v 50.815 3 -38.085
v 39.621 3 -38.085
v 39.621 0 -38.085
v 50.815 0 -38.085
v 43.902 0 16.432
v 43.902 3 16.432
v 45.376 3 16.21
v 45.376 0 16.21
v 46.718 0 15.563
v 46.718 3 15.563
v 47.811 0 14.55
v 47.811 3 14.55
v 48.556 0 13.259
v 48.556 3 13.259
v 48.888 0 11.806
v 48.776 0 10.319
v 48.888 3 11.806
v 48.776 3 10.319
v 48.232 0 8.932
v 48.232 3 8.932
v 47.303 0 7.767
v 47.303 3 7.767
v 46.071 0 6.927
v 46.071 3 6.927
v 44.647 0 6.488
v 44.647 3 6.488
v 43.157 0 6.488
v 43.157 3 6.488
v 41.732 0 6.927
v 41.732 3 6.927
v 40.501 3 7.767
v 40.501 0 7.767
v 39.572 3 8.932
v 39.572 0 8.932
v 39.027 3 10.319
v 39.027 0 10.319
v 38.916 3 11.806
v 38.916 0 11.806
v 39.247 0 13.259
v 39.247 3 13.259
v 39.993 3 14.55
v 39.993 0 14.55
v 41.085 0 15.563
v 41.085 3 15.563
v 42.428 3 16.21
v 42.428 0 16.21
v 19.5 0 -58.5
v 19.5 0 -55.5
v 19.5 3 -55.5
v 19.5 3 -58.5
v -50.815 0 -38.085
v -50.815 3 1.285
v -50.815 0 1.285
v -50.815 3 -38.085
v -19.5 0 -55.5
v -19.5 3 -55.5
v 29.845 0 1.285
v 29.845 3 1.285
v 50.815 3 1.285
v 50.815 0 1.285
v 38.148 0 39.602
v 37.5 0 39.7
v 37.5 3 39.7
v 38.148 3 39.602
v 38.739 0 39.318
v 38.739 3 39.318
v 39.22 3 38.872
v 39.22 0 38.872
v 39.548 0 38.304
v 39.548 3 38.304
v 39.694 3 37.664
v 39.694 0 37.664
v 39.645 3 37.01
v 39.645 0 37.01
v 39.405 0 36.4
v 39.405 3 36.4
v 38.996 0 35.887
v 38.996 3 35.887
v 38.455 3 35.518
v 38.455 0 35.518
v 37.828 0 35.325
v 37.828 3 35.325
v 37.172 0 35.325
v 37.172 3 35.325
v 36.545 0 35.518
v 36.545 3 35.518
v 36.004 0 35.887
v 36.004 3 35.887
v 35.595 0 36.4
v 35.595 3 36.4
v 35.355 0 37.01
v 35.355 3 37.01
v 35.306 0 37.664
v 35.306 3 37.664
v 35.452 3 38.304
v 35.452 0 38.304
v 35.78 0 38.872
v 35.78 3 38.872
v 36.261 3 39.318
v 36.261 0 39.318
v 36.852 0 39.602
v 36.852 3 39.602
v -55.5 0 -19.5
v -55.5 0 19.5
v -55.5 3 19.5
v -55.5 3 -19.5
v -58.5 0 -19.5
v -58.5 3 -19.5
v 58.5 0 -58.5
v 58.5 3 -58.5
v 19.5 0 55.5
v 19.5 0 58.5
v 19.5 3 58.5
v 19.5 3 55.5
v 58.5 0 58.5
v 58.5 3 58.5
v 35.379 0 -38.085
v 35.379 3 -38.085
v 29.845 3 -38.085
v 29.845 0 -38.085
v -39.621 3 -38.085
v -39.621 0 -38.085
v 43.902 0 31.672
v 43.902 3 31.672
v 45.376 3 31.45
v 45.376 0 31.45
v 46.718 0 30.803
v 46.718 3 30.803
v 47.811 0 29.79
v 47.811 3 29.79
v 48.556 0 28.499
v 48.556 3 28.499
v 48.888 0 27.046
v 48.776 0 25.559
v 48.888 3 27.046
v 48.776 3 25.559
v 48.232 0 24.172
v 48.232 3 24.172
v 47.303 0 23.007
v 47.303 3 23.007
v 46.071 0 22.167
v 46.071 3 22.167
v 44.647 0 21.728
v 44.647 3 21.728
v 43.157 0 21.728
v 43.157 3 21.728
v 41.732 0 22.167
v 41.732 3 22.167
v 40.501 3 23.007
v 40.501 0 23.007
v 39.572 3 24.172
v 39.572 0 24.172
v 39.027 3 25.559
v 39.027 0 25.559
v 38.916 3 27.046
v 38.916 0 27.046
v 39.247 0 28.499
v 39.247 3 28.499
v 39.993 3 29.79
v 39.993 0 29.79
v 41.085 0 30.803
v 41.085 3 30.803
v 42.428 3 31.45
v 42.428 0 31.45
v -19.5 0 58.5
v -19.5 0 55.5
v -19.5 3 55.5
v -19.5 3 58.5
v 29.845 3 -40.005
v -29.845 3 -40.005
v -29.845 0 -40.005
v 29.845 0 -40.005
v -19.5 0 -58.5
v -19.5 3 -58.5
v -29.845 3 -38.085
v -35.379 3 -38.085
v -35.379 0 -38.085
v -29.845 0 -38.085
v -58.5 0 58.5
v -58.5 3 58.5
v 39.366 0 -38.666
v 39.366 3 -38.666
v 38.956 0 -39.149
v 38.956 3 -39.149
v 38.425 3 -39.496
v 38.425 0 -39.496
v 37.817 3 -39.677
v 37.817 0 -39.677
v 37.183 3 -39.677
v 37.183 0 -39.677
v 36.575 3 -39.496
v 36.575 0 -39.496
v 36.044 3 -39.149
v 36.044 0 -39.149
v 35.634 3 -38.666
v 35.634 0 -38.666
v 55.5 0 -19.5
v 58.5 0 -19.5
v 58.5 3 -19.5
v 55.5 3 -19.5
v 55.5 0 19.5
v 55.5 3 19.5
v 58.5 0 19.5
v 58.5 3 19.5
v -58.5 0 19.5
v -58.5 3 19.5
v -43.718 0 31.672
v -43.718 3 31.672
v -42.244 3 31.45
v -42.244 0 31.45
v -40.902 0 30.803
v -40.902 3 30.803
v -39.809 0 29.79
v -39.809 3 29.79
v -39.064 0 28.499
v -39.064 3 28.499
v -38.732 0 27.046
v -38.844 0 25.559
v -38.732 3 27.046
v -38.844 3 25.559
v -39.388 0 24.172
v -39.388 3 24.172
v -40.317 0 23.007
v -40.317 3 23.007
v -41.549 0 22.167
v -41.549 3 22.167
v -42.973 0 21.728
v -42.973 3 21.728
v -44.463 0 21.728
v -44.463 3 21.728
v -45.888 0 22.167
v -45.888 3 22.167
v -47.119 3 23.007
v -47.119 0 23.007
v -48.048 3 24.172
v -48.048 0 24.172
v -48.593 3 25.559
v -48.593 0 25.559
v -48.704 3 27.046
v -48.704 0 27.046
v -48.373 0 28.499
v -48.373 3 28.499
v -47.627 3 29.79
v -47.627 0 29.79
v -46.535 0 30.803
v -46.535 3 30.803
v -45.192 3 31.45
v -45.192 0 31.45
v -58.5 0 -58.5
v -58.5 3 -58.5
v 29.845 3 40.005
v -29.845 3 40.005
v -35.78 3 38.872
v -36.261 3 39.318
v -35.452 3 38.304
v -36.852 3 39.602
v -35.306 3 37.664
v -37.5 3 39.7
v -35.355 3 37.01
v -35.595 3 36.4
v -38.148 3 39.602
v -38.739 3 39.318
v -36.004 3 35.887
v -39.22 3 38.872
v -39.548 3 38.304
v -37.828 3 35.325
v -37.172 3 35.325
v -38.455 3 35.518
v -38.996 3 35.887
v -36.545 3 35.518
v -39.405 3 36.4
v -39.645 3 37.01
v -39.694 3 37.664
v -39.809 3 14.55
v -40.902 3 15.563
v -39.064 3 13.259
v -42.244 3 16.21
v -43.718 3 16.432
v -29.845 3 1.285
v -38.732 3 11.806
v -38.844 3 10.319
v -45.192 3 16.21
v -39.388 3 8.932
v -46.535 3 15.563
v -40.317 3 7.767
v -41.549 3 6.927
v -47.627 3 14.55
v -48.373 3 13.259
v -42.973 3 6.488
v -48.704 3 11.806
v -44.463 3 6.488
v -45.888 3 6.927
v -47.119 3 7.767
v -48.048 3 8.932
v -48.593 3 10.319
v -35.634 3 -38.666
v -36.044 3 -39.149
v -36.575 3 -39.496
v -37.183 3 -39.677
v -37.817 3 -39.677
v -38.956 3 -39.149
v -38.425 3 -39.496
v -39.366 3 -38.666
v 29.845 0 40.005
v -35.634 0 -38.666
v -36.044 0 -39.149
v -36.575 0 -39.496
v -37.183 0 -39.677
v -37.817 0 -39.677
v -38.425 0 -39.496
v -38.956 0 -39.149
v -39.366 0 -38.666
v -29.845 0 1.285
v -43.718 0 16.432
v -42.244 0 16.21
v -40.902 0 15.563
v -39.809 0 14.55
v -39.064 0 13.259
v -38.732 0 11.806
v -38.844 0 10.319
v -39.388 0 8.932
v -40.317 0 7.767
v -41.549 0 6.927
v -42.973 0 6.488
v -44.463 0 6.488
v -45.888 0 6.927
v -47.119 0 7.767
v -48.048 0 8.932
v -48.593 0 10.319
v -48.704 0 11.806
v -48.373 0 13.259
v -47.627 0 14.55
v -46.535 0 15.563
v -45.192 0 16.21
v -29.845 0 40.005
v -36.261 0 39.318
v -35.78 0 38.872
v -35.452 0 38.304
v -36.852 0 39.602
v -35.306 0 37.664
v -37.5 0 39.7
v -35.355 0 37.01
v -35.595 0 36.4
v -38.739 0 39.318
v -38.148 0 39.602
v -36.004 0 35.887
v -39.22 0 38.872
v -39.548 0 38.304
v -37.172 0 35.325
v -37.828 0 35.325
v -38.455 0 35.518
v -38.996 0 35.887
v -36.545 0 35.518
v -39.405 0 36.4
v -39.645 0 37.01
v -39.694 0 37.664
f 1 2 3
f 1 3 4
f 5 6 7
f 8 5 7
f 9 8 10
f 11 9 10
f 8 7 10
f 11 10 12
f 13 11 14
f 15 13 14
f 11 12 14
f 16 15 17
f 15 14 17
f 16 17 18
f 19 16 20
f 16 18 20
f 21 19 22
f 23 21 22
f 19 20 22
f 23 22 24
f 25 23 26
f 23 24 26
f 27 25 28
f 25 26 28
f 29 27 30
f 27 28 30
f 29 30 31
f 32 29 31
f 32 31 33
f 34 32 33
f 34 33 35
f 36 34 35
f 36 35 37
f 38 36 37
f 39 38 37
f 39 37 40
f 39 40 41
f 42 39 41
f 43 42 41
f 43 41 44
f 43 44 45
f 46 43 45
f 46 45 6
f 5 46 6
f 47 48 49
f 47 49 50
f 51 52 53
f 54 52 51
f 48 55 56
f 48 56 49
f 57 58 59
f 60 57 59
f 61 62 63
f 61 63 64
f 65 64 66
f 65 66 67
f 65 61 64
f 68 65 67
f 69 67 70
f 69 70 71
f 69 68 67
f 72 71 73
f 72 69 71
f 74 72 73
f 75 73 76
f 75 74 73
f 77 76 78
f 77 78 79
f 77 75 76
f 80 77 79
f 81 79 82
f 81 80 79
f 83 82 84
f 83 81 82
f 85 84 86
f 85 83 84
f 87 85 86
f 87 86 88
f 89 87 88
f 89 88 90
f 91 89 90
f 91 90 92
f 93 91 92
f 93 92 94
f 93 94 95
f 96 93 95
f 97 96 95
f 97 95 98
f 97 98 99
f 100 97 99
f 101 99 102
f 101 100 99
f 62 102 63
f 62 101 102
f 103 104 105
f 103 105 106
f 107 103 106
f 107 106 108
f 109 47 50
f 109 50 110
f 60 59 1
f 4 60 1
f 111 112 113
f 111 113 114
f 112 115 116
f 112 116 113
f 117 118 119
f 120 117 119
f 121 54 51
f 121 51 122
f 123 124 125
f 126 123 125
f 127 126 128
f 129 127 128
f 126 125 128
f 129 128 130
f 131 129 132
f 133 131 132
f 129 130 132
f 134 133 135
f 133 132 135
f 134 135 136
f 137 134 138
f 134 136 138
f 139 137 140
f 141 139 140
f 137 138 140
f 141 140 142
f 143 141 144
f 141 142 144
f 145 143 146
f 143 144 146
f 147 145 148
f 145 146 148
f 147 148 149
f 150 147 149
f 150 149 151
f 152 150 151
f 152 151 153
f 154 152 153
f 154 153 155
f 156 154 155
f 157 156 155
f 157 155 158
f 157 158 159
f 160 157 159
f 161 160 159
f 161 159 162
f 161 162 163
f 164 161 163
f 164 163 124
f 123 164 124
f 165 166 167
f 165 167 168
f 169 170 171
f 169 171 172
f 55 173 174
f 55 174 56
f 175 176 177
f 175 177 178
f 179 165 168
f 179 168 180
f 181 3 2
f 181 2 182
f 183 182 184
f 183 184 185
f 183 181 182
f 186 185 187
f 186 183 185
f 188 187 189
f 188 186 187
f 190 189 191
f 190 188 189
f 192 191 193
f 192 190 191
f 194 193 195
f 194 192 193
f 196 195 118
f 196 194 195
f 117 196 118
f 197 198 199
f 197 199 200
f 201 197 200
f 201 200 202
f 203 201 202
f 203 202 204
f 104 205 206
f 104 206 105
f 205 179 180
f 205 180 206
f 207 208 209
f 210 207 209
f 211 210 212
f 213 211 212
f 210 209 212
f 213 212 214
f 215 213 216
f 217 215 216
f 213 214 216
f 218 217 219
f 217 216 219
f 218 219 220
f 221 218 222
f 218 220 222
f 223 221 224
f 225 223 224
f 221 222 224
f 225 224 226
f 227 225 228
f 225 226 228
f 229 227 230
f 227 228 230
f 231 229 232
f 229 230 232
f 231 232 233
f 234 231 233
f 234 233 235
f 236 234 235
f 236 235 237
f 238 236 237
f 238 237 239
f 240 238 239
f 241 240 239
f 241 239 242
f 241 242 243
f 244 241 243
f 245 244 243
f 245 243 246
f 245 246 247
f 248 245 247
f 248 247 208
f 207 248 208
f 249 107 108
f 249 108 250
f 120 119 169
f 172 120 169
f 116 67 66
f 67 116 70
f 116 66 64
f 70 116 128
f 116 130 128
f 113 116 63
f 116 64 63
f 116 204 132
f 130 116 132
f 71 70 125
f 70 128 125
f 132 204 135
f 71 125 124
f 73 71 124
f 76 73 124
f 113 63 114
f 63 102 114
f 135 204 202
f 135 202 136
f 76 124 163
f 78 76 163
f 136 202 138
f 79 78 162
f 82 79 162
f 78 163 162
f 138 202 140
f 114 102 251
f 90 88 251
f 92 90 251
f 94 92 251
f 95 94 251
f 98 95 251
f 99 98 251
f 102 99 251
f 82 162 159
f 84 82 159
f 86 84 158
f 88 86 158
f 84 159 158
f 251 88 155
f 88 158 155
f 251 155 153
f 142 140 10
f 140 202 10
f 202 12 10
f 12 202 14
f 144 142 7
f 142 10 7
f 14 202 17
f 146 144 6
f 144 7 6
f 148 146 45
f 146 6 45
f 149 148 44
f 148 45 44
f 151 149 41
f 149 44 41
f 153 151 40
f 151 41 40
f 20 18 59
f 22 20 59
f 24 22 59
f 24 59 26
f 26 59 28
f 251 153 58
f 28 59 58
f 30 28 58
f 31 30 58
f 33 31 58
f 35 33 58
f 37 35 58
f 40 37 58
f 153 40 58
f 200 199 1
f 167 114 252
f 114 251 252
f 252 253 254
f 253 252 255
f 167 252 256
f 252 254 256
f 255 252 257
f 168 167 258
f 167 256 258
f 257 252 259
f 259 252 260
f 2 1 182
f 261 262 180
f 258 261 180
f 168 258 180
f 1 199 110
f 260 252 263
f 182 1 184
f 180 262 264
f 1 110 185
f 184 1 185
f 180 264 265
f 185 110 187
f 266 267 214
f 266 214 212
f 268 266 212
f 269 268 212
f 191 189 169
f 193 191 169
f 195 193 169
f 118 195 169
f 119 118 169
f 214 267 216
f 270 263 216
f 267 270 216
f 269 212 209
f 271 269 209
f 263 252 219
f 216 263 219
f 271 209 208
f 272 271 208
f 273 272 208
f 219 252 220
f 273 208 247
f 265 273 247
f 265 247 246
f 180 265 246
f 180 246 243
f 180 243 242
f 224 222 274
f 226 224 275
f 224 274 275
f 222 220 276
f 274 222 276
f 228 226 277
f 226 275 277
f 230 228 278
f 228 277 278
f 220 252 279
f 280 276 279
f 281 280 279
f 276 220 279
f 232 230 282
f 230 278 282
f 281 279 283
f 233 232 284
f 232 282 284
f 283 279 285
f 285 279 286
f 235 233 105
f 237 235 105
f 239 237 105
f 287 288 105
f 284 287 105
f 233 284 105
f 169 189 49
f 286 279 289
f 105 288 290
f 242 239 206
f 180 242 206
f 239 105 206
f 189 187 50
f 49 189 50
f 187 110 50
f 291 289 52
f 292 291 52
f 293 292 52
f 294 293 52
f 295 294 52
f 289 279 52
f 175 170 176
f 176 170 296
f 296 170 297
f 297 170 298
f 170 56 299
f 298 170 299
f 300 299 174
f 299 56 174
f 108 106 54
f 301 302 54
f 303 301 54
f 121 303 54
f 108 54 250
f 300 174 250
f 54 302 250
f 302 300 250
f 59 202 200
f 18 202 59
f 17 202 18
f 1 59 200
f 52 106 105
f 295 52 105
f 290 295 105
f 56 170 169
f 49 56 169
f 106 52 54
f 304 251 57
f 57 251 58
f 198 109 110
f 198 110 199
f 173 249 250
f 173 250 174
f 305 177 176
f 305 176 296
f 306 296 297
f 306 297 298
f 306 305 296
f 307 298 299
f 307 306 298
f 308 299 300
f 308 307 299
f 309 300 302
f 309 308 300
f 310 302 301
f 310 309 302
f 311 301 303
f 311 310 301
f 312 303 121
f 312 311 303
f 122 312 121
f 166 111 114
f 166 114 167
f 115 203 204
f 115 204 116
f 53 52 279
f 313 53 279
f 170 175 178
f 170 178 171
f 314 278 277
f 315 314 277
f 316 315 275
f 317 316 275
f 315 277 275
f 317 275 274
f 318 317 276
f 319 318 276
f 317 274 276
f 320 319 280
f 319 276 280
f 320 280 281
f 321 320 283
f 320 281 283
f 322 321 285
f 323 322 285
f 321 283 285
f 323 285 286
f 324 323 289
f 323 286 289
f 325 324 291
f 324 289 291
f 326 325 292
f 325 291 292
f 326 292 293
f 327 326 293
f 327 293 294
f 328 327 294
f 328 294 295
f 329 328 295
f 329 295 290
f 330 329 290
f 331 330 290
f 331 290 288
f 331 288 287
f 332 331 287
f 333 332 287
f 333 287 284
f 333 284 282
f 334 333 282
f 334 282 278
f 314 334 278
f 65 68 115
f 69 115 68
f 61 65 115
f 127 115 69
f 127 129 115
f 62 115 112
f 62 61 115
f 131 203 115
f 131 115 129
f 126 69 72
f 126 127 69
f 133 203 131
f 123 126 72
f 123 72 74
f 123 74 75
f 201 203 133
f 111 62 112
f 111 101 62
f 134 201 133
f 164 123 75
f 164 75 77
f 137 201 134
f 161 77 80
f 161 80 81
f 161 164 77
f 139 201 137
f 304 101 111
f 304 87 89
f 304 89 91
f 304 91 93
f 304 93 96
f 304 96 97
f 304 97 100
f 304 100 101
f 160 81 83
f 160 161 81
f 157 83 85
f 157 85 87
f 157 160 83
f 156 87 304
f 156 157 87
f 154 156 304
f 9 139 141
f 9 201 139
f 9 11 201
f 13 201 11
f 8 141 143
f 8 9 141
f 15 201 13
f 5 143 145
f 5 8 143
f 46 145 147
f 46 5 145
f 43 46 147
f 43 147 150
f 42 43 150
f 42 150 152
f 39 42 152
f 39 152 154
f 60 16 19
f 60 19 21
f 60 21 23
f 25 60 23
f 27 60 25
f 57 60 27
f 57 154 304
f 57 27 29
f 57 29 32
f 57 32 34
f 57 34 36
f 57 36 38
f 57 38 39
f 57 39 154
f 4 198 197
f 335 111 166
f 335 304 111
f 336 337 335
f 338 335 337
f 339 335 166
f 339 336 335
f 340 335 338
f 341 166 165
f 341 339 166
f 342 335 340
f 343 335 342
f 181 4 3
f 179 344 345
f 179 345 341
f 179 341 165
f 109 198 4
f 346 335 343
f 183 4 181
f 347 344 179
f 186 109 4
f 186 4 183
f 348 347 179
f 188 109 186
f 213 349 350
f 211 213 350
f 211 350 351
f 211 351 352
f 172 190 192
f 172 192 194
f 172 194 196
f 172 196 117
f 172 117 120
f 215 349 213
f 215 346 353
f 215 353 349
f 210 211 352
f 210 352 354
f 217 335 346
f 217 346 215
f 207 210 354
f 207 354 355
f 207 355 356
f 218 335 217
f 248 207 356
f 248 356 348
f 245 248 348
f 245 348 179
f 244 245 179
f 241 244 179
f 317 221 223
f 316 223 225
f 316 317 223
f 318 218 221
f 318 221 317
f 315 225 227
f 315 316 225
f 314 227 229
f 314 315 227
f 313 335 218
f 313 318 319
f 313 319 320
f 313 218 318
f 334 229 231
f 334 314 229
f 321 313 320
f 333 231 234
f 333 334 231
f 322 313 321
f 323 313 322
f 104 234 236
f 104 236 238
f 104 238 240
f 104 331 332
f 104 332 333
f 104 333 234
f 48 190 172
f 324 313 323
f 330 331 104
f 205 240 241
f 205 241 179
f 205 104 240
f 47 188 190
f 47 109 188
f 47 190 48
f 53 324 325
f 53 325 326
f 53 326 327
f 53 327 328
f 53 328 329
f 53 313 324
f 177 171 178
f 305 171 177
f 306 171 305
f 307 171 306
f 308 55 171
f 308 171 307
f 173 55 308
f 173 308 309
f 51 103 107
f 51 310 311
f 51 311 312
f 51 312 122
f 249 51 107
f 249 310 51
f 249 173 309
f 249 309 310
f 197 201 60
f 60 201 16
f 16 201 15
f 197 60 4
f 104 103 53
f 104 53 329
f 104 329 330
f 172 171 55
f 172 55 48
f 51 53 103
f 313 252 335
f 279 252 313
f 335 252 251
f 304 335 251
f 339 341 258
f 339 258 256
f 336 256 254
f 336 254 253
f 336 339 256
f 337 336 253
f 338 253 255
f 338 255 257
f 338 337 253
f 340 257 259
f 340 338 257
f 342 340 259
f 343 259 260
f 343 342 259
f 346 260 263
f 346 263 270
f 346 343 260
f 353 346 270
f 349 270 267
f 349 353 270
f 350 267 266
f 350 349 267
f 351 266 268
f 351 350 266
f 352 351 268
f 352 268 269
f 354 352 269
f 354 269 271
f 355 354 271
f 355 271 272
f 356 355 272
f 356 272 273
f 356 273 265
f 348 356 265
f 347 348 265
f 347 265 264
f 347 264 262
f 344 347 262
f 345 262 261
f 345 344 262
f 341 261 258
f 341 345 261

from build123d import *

# Parameters (mm, degrees)
SKETCH1_R           = 2.2
BOSS_EXTRUDE1_DEPTH = 3
SKETCH3_W           = 19.05
SKETCH3_H           = 19.05
SKETCH3_R           = 2.2
SKETCH3_R_2         = 5
CUT_EXTRUDE1_DEPTH  = 83.785868359
CUT_EXTRUDE2_DEPTH  = 10


with BuildPart() as part:
    # Sketch1 → Boss-Extrude1 (new body)
    with BuildSketch(Plane(origin=(0, 0, 0), x_dir=(1, 0, 0), z_dir=(0, 1, 0))):
        Polygon((-58.5, 19.5), (-58.5, 58.5), (-19.5, 58.5), (-19.5, 55.5), (19.5, 55.5), (19.5, 58.5), (58.5, 58.5), (58.5, 19.5), (55.5, 19.5), (55.5, -19.5), (58.5, -19.5), (58.5, -58.5), (19.5, -58.5), (19.5, -55.5), (-19.5, -55.5), (-19.5, -58.5), (-58.5, -58.5), (-58.5, -19.5), (-55.5, -19.5), (-55.5, 19.5), align=None)
        with Locations(Location((-37.5, 37.5, 0), (0, 0, 270))):
            Circle(SKETCH1_R, mode=Mode.SUBTRACT)
        with Locations(Location((37.5, 37.5, 0), (0, 0, 270))):
            Circle(SKETCH1_R, mode=Mode.SUBTRACT)
        with Locations(Location((37.5, -37.5, 0), (0, 0, 270))):
            Circle(SKETCH1_R, mode=Mode.SUBTRACT)
        with Locations(Location((-37.5, -37.5, 0), (0, 0, 270))):
            Circle(SKETCH1_R, mode=Mode.SUBTRACT)
    extrude(amount=BOSS_EXTRUDE1_DEPTH)

    # Sketch3 → Cut-Extrude1 (cut, through all)
    with BuildSketch(Plane(origin=(0, 3, 0), x_dir=(1, 0, 0), z_dir=(0, 1, 0))):
        with Locations((20.32, 30.48)):
            Rectangle(SKETCH3_W, SKETCH3_H)
        with Locations((20.32, 10.16)):
            Rectangle(SKETCH3_W, SKETCH3_H)
        with Locations((20.32, -10.16)):
            Rectangle(SKETCH3_W, SKETCH3_H)
        with Locations((20.32, -30.48)):
            Rectangle(SKETCH3_W, SKETCH3_H)
        with Locations((0, -30.48)):
            Rectangle(SKETCH3_W, SKETCH3_H)
        with Locations((0, -10.16)):
            Rectangle(SKETCH3_W, SKETCH3_H)
        with Locations((0, 10.16)):
            Rectangle(SKETCH3_W, SKETCH3_H)
        with Locations((0, 30.48)):
            Rectangle(SKETCH3_W, SKETCH3_H)
        with Locations((-20.32, 30.48)):
            Rectangle(SKETCH3_W, SKETCH3_H)
        with Locations((-20.32, 10.16)):
            Rectangle(SKETCH3_W, SKETCH3_H)
        with Locations((-20.32, -10.16)):
            Rectangle(SKETCH3_W, SKETCH3_H)
        with Locations((-20.32, -30.48)):
            Rectangle(SKETCH3_W, SKETCH3_H)
        with Locations((-37.5, 37.5)):
            Circle(SKETCH3_R)
        with Locations((-41.29, 28.56)):
            Rectangle(SKETCH3_W, SKETCH3_H)
        with Locations((-41.29, 8.24)):
            Rectangle(SKETCH3_W, SKETCH3_H)
        with Locations((37.5, 37.5)):
            Circle(SKETCH3_R)
        with Locations((41.29, 28.56)):
            Rectangle(SKETCH3_W, SKETCH3_H)
        with Locations((41.29, 8.24)):
            Rectangle(SKETCH3_W, SKETCH3_H)
        with Locations(Location((-43.718159869, -11.432070866, 0), (0, 0, 270))):
            Circle(SKETCH3_R_2)
        with Locations(Location((-43.718159869, -26.672070866, 0), (0, 0, 270))):
            Circle(SKETCH3_R_2)
        with Locations(Location((43.901840131, -11.432070866, 0), (0, 0, 270))):
            Circle(SKETCH3_R_2)
        with Locations(Location((43.901840131, -26.672070866, 0), (0, 0, 270))):
            Circle(SKETCH3_R_2)
    extrude(amount=-CUT_EXTRUDE1_DEPTH, mode=Mode.SUBTRACT)

    # Sketch4 → Cut-Extrude2 (cut)
    with BuildSketch(Plane(origin=(0, 3, 0), x_dir=(1, 0, 0), z_dir=(0, 1, 0))):
        Polygon((-31.765, -1.285), (-29.845, -1.285), (-29.845, -40.005), (29.845, -40.005), (29.845, -1.285), (50.815, -1.285), (50.815, 38.085), (29.845, 38.085), (10.795, 40.005), (-10.795, 40.005), (-29.845, 38.085), (-31.765, 38.085), (-50.815, 19.035), (-50.815, 17.765), align=None)
    extrude(amount=-CUT_EXTRUDE2_DEPTH, mode=Mode.SUBTRACT)


solid = part.part
